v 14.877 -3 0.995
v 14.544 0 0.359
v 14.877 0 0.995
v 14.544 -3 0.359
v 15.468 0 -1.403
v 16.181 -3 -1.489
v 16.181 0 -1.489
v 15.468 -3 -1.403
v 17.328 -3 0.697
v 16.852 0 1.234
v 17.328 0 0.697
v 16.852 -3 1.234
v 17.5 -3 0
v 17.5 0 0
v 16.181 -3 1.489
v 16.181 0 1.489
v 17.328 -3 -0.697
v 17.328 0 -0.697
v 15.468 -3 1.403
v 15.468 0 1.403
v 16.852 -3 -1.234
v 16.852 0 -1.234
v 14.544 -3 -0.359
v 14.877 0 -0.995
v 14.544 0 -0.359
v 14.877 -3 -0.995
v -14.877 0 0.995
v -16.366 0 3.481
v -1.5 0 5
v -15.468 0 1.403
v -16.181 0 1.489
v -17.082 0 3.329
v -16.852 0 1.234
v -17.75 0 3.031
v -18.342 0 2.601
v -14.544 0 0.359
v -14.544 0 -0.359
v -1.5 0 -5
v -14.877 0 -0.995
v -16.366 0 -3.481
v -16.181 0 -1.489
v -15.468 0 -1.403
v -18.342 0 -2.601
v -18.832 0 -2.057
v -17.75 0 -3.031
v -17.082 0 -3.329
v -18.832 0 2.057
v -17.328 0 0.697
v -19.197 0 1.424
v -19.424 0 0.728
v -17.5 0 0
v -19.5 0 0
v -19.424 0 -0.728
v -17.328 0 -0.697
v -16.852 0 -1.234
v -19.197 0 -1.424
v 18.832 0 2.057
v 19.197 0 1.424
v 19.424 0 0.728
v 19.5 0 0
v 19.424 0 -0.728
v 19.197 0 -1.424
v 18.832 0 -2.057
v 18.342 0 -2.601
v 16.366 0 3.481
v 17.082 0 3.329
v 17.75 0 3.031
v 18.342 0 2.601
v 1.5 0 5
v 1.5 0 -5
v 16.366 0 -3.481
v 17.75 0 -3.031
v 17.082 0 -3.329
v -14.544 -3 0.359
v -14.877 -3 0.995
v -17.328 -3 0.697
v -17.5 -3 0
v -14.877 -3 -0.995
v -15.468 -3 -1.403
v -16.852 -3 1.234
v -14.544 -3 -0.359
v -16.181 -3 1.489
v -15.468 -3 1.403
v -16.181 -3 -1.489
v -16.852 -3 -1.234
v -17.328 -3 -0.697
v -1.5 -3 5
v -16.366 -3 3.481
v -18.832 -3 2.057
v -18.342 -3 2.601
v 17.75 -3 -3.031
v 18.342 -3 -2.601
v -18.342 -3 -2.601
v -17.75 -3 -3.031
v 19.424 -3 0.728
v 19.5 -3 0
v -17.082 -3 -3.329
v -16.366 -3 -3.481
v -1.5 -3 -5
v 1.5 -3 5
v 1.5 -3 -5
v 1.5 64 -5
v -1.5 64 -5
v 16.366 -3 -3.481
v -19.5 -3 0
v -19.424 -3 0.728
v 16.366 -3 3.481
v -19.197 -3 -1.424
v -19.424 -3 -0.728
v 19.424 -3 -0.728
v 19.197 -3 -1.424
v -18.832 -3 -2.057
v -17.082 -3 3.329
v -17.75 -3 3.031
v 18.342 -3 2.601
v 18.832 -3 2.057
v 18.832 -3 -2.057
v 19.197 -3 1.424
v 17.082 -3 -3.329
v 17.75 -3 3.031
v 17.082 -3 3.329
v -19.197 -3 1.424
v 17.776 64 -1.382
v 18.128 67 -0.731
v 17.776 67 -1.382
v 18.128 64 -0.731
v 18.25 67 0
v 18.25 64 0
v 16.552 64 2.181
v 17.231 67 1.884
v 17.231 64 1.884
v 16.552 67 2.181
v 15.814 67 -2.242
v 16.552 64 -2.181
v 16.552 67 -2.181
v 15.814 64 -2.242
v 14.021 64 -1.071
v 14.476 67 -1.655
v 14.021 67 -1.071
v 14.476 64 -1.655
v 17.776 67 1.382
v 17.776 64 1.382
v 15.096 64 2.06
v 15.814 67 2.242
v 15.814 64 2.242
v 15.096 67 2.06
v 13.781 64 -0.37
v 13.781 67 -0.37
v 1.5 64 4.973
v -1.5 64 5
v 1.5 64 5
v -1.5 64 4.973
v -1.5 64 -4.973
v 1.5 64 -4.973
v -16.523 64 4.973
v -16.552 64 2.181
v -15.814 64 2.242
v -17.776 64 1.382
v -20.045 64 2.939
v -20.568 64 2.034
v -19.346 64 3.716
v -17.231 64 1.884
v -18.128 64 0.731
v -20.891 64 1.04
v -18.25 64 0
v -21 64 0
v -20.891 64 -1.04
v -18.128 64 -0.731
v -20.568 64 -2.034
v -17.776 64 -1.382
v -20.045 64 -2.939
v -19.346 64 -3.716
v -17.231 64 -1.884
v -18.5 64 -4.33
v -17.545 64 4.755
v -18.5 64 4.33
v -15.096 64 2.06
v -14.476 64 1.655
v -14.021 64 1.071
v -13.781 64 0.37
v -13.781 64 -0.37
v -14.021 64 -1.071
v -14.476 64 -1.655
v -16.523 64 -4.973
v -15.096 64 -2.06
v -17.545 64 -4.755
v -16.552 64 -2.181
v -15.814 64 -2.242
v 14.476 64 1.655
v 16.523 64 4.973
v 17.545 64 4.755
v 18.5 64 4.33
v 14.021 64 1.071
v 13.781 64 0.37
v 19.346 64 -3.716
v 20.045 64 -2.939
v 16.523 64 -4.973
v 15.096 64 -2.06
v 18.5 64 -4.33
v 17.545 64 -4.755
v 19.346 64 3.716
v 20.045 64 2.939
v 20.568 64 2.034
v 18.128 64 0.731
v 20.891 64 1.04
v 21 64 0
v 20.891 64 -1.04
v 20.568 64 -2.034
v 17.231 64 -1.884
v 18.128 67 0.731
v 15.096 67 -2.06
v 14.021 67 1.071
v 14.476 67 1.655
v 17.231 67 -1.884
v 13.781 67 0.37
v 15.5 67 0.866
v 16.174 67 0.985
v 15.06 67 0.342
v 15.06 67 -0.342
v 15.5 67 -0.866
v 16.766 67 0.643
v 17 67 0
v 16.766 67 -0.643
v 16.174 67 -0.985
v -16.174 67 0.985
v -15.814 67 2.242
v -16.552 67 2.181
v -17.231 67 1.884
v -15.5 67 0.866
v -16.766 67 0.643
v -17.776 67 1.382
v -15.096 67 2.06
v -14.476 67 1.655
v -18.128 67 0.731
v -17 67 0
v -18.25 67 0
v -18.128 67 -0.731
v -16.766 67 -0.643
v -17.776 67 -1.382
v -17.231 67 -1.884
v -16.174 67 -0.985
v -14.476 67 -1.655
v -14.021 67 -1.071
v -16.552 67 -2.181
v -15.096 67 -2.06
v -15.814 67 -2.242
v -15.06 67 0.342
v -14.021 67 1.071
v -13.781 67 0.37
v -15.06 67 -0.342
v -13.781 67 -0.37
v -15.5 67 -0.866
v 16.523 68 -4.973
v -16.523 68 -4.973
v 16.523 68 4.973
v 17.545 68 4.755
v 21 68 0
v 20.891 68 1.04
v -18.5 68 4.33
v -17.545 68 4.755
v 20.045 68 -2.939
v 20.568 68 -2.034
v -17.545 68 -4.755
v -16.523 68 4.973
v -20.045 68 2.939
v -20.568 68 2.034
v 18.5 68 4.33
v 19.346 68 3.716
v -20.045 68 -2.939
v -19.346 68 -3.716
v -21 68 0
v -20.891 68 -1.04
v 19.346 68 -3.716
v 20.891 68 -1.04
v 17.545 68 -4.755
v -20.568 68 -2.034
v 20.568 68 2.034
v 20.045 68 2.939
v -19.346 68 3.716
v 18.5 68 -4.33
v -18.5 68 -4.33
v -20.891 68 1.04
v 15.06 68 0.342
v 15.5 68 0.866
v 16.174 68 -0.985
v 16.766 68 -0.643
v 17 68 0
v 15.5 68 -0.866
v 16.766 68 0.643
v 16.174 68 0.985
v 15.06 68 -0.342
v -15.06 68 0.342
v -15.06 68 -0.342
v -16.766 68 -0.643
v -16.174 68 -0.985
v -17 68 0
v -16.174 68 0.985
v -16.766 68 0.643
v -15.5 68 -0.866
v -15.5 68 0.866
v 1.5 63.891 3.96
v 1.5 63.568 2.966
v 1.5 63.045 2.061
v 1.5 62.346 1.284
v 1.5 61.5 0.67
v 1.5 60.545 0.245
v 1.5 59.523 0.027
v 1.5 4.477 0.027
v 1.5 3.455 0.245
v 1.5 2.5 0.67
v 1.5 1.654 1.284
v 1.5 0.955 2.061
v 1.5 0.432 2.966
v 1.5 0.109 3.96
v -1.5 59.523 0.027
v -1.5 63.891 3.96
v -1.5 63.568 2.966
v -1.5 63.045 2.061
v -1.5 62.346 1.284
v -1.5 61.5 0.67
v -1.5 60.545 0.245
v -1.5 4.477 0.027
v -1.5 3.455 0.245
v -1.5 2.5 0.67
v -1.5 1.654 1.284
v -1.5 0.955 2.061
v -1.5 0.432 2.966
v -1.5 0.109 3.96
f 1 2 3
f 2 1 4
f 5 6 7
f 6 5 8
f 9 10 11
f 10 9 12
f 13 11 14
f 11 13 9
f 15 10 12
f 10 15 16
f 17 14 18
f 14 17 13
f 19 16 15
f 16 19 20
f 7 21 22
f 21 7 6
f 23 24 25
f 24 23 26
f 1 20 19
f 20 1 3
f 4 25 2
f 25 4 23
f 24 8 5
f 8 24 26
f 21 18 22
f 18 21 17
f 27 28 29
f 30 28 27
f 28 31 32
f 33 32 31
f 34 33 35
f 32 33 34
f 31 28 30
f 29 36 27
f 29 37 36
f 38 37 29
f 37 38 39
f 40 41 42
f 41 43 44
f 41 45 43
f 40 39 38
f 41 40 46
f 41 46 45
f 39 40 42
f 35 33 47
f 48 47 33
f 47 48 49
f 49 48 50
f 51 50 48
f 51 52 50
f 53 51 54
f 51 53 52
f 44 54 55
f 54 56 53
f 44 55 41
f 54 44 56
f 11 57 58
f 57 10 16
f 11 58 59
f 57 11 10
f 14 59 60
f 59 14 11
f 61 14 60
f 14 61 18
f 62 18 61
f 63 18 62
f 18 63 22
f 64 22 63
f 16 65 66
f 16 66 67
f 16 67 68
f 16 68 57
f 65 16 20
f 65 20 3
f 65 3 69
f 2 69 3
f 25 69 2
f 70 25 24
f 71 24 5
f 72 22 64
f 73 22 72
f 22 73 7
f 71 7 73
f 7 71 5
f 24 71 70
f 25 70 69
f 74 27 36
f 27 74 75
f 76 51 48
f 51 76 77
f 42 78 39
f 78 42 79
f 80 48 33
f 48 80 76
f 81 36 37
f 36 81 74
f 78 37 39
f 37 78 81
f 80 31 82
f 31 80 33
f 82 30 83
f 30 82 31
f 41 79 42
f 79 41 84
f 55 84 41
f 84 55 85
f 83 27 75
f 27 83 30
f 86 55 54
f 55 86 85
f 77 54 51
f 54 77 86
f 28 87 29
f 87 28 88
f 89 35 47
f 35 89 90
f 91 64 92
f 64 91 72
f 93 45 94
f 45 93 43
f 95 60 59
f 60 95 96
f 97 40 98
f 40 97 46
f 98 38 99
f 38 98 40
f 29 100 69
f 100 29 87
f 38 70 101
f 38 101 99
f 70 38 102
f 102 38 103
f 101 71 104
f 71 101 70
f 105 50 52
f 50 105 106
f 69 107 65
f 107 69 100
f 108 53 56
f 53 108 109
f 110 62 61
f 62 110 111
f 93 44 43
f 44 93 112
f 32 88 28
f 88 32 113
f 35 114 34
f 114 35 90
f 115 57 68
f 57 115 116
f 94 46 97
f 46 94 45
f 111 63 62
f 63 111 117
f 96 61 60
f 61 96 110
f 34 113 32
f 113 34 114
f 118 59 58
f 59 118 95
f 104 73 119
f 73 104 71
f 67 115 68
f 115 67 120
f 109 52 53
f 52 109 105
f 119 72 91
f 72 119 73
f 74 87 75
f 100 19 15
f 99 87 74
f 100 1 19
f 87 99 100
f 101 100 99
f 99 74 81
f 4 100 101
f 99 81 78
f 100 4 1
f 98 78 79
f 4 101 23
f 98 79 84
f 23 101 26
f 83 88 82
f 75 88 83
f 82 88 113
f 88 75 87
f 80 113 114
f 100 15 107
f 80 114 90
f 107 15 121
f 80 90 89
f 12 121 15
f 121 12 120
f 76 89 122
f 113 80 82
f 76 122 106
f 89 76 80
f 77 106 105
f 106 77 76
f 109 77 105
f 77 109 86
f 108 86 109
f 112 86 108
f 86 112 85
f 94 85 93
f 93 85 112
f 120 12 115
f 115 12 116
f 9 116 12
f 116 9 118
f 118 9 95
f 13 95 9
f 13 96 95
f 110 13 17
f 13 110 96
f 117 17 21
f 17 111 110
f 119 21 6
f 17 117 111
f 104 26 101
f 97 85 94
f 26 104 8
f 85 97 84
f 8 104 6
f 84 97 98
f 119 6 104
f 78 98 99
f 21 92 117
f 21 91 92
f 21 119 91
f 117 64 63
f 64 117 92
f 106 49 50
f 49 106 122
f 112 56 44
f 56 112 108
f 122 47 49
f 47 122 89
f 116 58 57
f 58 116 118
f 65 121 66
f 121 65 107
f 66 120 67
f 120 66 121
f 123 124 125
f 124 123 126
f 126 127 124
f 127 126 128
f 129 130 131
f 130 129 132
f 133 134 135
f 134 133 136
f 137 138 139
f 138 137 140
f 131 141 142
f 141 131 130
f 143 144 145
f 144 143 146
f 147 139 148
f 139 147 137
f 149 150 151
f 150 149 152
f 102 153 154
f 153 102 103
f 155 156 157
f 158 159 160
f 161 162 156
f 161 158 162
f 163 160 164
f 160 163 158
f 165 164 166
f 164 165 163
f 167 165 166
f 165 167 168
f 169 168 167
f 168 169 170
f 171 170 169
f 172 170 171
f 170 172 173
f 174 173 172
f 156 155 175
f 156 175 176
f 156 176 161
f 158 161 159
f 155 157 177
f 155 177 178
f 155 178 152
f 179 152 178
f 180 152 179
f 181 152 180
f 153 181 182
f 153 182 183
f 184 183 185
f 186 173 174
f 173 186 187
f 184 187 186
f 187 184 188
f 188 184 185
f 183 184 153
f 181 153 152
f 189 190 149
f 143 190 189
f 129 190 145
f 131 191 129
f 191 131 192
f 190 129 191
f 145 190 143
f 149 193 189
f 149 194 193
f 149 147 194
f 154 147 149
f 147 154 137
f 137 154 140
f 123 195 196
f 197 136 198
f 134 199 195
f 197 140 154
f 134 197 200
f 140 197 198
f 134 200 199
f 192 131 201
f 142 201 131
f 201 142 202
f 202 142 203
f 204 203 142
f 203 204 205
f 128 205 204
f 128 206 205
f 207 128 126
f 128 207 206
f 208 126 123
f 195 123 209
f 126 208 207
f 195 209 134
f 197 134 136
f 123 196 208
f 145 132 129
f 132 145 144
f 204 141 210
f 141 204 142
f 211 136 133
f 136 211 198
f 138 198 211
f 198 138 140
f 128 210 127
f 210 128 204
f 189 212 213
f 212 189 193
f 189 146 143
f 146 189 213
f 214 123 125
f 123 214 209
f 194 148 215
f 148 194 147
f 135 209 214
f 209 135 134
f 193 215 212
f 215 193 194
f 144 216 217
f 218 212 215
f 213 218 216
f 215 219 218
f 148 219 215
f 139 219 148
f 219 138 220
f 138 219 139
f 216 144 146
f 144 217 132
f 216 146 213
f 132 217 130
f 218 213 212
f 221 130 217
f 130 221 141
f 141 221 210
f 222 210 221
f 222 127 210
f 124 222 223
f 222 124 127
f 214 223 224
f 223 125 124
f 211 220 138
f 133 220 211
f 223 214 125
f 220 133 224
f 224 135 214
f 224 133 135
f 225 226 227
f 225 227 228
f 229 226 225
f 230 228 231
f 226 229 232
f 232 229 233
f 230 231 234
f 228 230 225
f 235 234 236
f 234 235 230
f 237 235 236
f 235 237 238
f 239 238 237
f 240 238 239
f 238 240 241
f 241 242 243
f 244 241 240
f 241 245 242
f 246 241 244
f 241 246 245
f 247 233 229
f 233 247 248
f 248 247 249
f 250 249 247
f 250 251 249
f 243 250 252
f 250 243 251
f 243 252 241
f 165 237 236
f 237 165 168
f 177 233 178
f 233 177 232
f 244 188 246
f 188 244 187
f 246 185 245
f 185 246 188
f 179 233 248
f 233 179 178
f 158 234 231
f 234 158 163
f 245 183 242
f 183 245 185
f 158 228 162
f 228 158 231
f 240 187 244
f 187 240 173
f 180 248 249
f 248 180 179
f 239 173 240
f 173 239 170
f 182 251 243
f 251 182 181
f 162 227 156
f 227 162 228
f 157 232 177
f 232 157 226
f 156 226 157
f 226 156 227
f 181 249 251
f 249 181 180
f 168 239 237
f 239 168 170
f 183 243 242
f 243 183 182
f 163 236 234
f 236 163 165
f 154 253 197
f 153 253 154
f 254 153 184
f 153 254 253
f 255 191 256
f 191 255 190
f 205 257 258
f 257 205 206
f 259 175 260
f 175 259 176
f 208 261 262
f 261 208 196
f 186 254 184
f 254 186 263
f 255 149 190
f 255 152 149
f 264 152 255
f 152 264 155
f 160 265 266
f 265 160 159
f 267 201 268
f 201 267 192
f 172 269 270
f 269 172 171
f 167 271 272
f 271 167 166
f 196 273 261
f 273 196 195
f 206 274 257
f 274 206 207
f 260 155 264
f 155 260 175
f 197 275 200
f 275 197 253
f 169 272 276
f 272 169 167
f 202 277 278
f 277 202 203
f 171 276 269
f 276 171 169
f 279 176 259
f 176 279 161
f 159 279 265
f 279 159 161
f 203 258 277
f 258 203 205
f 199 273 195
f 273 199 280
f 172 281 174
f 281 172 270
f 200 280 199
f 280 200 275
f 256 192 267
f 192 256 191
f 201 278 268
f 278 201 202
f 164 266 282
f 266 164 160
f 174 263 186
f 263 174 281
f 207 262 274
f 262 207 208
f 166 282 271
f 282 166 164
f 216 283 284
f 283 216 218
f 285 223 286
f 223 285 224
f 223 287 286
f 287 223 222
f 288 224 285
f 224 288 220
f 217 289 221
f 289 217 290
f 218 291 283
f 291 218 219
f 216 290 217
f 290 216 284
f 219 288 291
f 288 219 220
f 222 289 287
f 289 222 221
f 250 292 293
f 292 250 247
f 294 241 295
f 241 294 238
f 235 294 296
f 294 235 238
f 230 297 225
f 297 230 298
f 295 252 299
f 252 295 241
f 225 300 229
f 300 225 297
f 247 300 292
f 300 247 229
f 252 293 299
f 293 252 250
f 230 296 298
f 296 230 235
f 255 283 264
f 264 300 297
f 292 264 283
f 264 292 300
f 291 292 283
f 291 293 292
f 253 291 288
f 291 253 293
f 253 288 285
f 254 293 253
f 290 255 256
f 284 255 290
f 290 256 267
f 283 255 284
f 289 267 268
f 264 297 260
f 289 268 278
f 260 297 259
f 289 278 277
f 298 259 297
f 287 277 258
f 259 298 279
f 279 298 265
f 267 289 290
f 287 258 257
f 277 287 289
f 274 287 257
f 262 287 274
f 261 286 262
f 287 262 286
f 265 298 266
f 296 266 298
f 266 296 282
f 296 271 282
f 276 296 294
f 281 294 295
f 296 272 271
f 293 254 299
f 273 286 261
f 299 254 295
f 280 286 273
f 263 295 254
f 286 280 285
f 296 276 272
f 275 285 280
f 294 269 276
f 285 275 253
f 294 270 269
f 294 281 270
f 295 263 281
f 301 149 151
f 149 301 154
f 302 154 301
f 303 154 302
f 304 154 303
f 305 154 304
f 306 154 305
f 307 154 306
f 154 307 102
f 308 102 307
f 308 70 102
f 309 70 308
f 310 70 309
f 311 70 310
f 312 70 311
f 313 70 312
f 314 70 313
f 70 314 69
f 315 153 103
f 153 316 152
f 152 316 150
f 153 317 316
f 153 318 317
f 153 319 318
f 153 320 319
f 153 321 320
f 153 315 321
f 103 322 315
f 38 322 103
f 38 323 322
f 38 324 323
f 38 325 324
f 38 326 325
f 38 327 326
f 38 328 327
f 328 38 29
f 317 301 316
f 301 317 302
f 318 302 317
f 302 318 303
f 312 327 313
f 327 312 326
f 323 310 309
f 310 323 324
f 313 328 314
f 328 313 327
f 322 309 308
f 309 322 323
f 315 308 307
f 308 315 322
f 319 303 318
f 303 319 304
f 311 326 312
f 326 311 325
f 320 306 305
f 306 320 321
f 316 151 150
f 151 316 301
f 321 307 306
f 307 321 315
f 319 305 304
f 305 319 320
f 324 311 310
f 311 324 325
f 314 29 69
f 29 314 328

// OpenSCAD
$fs=.75;

union() {
	rotate(a = [90, 0, 0]) {
		difference() {
			hull() {
				translate(v = [16.0000000000, 0, 0]) {
					cylinder(d = 7, h = 3);
				}
				translate(v = [-16.0000000000, 0, 0]) {
					cylinder(d = 7, h = 3);
				}
				translate(v = [0, 0, 1.5000000000]) {
					translate(v = [-1.5000000000, -5.0000000000, -1.5000000000]) {
						cube(size = [3, 10, 3]);
					}
				}
			}
			union() {
				translate(v = [16, 0, 0]) {
					cylinder(d = 3.0000000000, h = 4);
				}
				mirror(v = [1, 0, 0]) {
					translate(v = [16, 0, 0]) {
						cylinder(d = 3.0000000000, h = 4);
					}
				}
			}
		}
	}
	translate(v = [0, 64, 0]) {
		union() {
			rotate(a = [-90, 0, 0]) {
				difference() {
					hull() {
						translate(v = [-16.0000000000, 0, 0]) {
							cylinder(d = 10, h = 3);
						}
						translate(v = [16.0000000000, 0, 0]) {
							cylinder(d = 10, h = 3);
						}
					}
					union() {
						translate(v = [16, 0, 0]) {
							cylinder(d = 4.5000000000, h = 3);
						}
						mirror(v = [1, 0, 0]) {
							translate(v = [16, 0, 0]) {
								cylinder(d = 4.5000000000, h = 3);
							}
						}
					}
				}
			}
			translate(v = [0, 3, 0]) {
				rotate(a = [-90, 0, 0]) {
					difference() {
						hull() {
							translate(v = [-16.0000000000, 0, 0]) {
								cylinder(d = 10, h = 1);
							}
							translate(v = [16.0000000000, 0, 0]) {
								cylinder(d = 10, h = 1);
							}
						}
						union() {
							translate(v = [16, 0, 0]) {
								cylinder(d = 2, h = 3);
							}
							mirror(v = [1, 0, 0]) {
								translate(v = [16, 0, 0]) {
									cylinder(d = 2, h = 3);
								}
							}
						}
					}
				}
			}
		}
	}
	difference() {
		translate(v = [0, 32.0000000000, 0]) {
			translate(v = [-1.5000000000, -32.0000000000, -5.0000000000]) {
				cube(size = [3, 64, 10]);
			}
		}
		translate(v = [-2, 32, 5]) {
			rotate(a = [90, 0, 90]) {
				hull() {
					translate(v = [-27.0000000000, 0, 0]) {
						cylinder(d = 10, h = 6);
					}
					translate(v = [27.0000000000, 0, 0]) {
						cylinder(d = 10, h = 6);
					}
				}
			}
		}
	}
}
/***********************************************
*********      SolidPython code:      **********
************************************************
 
from solid import *
from solid import extensions
from math import *

class Object:
    pass

w = 32
l = 64
screw = 3.0
shaftD = 4.5
thk=3
h=10

def washer(r1,r0,h=1):
	return cylinder(r=r1,h=h)-cylinder(r=r0,h=h).set_hole()

def rbeam(w,l,thk):
	return hull(cylinder(d=w,h=thk).move(x=-l/2.),
	     	     cylinder(d=w,h=thk).move(x=l/2.))

bean1 = (hull(cylinder(d=7,h=thk).move(x=w/2.), cylinder(d=7,h=thk).move(x=-w/2.), cube([thk,h,thk]).align('z-'))
	     - cylinder(d=screw,h=thk+1).move(x=w/2).mirrorCopy('x')
	    ).rot(x=90)

bean2 = ( rbeam(h,w,thk)
	     - cylinder(d=shaftD,h=thk).move(x=w/2).mirrorCopy('x')
	    ).rot(x=-90)

bean2_1 = ( rbeam(h,w,1)
	     - cylinder(d=2,h=thk).move(x=w/2).mirrorCopy('x')).rot(x=-90).move(y=thk)

middleBar = ( cube([thk,l,h]).align('y-')
	          -rbeam(h,l-h,thk*2).rot(x=90,z=90).move(x=-thk/2,y=l/2,z=h/2))
scene = bean1+(bean2+bean2_1).move(y=l)+middleBar
scad_render_to_file(scene, 'preview.scad', '$fs=.75;')
 
 
************************************************/
